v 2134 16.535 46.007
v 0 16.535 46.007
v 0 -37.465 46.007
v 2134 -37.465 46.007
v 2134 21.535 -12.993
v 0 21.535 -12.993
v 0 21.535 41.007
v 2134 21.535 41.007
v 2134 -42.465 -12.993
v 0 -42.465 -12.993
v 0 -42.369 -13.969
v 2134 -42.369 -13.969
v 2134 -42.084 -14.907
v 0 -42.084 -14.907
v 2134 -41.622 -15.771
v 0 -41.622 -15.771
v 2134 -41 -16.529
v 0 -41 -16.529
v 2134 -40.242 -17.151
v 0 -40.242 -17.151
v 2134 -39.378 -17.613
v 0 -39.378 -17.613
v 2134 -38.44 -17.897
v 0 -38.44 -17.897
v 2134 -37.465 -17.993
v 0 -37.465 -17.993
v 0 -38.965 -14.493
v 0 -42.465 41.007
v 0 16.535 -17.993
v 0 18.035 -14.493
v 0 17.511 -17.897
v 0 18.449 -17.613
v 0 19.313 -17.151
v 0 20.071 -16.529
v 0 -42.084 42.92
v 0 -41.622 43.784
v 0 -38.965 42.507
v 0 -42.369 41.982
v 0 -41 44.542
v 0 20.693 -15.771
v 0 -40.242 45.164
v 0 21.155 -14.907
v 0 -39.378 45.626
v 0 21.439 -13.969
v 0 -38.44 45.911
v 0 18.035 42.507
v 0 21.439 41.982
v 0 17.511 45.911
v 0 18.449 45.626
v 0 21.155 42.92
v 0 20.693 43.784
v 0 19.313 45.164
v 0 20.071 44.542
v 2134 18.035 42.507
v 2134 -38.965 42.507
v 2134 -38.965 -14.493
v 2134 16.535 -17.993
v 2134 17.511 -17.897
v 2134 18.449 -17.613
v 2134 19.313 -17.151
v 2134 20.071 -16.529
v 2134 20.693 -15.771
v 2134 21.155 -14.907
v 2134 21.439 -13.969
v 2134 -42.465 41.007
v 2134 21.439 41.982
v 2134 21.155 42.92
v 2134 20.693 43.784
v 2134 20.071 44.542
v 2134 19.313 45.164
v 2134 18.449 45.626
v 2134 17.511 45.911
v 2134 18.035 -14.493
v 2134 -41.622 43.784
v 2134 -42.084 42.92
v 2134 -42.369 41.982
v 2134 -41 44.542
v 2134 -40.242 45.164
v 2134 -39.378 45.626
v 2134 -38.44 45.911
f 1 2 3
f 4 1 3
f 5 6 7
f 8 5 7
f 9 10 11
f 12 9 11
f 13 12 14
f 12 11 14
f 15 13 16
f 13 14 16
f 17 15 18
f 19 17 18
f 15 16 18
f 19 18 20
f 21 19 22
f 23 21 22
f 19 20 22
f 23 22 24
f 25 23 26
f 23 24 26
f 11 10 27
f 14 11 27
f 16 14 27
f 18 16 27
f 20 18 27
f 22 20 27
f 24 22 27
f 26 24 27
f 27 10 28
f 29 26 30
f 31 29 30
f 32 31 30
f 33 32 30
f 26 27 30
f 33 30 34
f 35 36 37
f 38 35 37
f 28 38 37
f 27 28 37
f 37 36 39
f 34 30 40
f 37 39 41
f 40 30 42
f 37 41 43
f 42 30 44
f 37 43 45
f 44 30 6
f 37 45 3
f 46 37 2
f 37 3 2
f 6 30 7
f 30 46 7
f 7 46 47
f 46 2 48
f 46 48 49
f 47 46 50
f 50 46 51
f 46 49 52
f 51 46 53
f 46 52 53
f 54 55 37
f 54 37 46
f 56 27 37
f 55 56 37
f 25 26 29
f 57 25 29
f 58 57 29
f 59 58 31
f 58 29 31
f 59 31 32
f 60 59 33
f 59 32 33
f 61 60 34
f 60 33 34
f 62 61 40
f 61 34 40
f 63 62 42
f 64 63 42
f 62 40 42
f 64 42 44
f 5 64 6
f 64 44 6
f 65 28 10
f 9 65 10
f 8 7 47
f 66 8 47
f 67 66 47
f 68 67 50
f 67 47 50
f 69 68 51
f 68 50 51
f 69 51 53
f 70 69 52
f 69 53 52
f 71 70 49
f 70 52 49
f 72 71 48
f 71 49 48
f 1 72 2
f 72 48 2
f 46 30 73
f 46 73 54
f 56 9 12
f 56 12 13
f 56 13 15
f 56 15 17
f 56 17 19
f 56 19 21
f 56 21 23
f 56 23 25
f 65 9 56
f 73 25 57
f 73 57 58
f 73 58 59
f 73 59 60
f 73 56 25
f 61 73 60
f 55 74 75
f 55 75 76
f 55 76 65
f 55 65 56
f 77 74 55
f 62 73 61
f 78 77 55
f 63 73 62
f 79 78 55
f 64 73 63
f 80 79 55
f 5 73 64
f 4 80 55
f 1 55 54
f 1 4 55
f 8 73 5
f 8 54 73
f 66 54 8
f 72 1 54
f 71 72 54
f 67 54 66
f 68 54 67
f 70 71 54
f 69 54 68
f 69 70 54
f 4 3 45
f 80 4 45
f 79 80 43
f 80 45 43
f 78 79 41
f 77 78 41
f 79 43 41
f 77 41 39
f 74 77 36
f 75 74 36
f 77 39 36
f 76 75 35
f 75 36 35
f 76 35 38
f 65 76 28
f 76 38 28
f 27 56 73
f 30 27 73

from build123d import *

# Parameters (mm, degrees)
F0_W     = 57
F0_H     = 57
F1_DEPTH = 2134


with BuildPart() as f1:
    # F0 (on Right) → F1 (new body)
    with BuildSketch(Plane.YZ):
        with BuildLine():
            Line((16.53541, 46.006598), (-37.46459, 46.006598))
            ThreePointArc((-37.46459, 46.006598), (-41.000124, 44.542132), (-42.46459, 41.006598))
            Line((-42.46459, 41.006598), (-42.46459, -12.993402))
            ThreePointArc((-42.46459, -12.993402), (-41.000124, -16.528936), (-37.46459, -17.993402))
            Line((-37.46459, -17.993402), (16.53541, -17.993402))
            ThreePointArc((16.53541, -17.993402), (20.070944, -16.528936), (21.53541, -12.993402))
            Line((21.53541, -12.993402), (21.53541, 41.006598))
            ThreePointArc((21.53541, 41.006598), (20.070944, 44.542132), (16.53541, 46.006598))
        make_face()
        with Locations((-10.46459, 14.006598)):
            Rectangle(F0_W, F0_H, mode=Mode.SUBTRACT)
    extrude(amount=F1_DEPTH)


solid = f1.part
